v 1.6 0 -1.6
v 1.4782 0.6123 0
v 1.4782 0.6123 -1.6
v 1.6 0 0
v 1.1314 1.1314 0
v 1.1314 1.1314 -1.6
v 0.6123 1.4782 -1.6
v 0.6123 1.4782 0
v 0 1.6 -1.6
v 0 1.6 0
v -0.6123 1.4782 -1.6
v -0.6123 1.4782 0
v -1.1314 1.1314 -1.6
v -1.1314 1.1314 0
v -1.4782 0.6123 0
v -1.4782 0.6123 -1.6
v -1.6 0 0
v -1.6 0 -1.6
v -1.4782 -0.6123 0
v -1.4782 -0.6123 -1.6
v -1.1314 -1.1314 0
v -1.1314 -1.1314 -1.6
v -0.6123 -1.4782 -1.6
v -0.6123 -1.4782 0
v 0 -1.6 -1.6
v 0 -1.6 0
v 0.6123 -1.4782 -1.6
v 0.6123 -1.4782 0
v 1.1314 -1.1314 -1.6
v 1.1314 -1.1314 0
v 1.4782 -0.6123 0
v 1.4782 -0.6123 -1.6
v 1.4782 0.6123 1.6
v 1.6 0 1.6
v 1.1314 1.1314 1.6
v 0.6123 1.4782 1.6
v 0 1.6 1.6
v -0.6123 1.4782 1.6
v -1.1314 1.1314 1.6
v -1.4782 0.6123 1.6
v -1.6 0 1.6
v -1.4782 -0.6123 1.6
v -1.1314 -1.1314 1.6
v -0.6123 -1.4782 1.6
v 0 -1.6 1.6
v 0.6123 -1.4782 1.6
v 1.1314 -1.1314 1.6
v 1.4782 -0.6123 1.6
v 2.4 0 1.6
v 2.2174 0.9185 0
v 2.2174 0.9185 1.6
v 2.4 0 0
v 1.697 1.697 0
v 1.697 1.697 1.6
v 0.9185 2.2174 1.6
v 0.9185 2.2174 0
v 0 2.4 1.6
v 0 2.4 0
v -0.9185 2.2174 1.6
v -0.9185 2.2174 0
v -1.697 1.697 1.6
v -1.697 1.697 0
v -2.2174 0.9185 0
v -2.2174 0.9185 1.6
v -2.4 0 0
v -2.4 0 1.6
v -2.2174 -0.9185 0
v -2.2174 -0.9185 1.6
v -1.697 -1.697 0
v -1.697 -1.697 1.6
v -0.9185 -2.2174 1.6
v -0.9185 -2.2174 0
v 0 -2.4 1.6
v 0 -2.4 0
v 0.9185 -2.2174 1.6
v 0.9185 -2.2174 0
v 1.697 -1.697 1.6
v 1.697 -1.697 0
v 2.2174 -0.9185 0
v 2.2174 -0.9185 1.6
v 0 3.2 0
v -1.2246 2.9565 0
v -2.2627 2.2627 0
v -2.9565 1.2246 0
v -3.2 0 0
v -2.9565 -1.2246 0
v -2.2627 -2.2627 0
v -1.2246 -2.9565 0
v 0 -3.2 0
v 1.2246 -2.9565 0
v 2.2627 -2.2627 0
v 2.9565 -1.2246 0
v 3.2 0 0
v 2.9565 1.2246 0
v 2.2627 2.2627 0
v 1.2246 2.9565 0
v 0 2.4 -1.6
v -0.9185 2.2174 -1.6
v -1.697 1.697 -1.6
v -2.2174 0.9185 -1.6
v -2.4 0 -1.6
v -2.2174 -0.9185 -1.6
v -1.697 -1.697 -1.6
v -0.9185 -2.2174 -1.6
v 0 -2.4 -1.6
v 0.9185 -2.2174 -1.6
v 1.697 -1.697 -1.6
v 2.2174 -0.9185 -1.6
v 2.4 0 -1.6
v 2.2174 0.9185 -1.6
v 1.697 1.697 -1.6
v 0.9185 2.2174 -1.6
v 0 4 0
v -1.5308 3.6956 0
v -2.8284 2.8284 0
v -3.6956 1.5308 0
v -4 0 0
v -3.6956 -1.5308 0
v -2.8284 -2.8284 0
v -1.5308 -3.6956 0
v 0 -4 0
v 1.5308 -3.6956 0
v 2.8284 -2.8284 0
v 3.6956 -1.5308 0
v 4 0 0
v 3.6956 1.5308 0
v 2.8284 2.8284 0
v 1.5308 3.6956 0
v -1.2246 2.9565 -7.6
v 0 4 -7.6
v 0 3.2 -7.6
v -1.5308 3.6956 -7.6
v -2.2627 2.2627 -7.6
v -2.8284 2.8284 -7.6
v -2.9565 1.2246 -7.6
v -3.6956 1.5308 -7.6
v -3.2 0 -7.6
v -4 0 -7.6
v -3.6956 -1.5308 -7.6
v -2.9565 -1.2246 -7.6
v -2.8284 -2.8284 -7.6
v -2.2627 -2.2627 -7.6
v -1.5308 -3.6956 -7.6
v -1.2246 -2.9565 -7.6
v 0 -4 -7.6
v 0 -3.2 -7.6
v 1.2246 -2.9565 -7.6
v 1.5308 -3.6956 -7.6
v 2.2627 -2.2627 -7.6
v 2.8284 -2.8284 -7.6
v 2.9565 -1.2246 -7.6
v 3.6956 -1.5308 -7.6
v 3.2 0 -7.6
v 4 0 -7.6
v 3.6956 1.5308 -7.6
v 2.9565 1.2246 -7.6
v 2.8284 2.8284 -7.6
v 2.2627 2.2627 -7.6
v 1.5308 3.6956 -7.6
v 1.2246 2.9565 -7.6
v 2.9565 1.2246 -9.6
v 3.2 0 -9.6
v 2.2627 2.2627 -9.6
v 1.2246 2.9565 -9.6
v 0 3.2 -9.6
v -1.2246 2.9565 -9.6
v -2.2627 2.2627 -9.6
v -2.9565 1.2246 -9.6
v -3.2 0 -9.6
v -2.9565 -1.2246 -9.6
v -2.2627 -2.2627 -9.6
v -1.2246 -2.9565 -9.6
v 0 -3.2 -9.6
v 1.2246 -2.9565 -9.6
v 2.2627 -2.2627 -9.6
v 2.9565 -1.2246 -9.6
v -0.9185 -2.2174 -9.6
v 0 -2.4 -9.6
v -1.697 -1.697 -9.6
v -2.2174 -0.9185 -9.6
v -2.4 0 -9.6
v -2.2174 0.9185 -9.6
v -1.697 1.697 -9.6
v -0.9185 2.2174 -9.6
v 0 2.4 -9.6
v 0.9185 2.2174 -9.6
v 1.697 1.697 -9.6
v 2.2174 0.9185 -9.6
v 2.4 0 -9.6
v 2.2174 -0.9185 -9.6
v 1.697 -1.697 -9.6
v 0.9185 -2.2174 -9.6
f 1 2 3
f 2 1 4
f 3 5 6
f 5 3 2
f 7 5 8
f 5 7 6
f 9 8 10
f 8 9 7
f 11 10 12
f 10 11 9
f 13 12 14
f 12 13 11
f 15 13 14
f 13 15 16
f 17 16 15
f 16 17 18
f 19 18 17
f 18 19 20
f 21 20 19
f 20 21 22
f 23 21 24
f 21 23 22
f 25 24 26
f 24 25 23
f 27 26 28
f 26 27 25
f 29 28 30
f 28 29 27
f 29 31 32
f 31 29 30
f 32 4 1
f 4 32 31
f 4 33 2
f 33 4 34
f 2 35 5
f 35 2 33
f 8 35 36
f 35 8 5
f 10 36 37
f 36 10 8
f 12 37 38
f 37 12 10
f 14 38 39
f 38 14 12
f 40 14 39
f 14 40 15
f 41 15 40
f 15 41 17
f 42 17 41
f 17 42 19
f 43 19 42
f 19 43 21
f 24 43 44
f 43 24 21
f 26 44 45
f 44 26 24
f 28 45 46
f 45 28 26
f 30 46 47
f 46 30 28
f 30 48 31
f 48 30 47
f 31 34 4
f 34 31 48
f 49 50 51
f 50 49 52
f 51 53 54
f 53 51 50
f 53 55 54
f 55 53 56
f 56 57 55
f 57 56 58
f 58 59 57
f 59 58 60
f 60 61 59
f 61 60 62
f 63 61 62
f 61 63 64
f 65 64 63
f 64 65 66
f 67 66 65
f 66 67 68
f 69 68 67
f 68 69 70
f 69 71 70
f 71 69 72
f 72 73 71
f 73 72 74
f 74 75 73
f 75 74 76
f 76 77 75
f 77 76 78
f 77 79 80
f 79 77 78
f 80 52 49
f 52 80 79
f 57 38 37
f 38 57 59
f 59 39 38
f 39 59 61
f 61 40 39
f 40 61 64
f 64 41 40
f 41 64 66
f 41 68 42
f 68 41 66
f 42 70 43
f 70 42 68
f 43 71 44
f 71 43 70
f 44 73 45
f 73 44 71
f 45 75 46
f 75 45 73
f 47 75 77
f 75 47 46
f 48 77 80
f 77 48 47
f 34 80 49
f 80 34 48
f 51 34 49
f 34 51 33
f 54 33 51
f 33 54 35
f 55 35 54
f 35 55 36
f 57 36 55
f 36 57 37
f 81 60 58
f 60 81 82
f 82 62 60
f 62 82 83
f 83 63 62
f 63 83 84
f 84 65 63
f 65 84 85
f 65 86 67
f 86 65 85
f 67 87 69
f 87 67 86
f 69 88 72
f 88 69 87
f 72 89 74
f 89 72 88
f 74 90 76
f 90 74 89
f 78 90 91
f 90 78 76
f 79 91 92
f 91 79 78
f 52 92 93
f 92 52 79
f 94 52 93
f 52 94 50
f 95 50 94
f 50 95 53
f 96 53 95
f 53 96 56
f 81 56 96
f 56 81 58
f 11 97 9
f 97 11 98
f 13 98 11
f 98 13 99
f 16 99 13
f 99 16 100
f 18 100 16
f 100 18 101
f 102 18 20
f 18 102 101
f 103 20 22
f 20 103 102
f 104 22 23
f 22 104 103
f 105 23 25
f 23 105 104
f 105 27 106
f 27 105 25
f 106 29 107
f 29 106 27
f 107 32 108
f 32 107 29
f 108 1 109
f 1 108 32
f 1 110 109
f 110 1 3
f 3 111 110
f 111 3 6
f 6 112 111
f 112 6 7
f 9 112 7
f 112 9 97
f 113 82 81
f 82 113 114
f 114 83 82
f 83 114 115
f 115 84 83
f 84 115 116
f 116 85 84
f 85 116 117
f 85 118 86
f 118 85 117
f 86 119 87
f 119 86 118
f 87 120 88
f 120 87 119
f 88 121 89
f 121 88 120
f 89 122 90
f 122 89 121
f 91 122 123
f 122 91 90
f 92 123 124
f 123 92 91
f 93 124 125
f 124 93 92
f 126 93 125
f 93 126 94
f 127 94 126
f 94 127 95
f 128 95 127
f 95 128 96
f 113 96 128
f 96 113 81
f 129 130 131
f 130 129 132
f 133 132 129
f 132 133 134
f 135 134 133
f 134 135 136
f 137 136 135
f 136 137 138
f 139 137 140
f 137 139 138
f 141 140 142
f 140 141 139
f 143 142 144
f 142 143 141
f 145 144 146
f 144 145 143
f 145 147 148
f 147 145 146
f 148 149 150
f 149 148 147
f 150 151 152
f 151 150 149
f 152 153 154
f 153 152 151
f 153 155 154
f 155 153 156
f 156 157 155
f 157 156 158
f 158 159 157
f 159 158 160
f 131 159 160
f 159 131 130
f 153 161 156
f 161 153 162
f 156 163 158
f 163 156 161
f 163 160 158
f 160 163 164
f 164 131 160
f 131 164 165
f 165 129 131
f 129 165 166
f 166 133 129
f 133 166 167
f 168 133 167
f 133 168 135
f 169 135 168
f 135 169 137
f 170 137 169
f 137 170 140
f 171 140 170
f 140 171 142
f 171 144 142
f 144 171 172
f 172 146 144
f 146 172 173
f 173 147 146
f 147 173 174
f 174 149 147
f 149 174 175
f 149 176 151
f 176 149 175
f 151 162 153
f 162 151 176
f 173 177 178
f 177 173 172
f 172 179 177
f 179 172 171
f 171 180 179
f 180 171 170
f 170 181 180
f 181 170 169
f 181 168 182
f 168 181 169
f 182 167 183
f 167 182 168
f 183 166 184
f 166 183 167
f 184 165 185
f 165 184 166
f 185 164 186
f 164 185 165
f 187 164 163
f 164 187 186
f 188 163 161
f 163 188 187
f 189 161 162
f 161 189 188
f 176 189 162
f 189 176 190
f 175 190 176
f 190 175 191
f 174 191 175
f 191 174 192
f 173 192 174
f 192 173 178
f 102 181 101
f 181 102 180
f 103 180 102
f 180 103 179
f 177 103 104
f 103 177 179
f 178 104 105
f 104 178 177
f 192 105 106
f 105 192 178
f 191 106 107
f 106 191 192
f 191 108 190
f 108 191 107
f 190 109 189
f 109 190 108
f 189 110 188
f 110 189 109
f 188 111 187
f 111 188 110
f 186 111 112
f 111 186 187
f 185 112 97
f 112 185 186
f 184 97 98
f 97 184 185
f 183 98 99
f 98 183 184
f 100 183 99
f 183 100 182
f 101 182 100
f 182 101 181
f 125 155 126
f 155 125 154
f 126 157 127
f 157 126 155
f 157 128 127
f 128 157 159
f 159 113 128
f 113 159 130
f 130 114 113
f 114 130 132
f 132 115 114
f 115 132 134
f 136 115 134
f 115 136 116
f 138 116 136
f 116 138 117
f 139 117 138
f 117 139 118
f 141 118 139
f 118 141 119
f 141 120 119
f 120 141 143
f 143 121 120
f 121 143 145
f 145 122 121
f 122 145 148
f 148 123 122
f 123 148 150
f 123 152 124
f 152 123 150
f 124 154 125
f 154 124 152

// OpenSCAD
// file: ../p/stud4od.scad
use <../lib.scad>
use <4-4cylo.scad>
use <4-4ring3.scad>
function ldraw_lib__stud4od() = [
// 0 Stud Tube Open without Outer Cylinder and Top Surface
// 0 Name: stud4od.dat
// 0 Author: Philippe Hurbain [Philo]
// 0 !LDRAW_ORG Primitive UPDATE 2013-02
// 0 !LICENSE Licensed under CC BY 2.0 and CC BY 4.0 : see CAreadme.txt
// 
// 0 !HELP This stud is a "antistud" to be used like a underside stud,
// 0 !HELP but without the outer cylinder.
// 0 !HELP 1 47 0 0 0 1 0 0 0 1 0 0 0 1 stud4.dat
// 
// 0 BFC CERTIFY CCW
  [0,"BFC","CERTIFY"],
  [0,"BFC","CCW"],
// 
// 0 !HISTORY 2013-12-23 [PTadmin] Official Update 2013-02
// 
// 
// 1 16 0 -4 0 2 0 0 0 1 0 0 0 2 4-4ring3.dat
  [1,16,0,-4,0,2,0,0,0,1,0,0,0,2, ldraw_lib__4_4ring3()],
// 0 BFC INVERTNEXT
  [0,"BFC","INVERTNEXT"],
// 1 16 0 0 0 -6 0 0 0 -4 0 0 0 6 4-4cylo.dat
  [1,16,0,0,0,-6,0,0,0,-4,0,0,0,6, ldraw_lib__4_4cylo()],
];
makepoly(ldraw_lib__stud4od(), line=0.2);
// file: ../p/stud2a.scad
use <../lib.scad>
use <4-4cyli.scad>
use <4-4edge.scad>
use <4-4ring2.scad>
function ldraw_lib__stud2a() = [
// 0 Stud Open without Base Edges
// 0 Name: stud2a.dat
// 0 Author: James Jessiman
// 0 !LDRAW_ORG Primitive UPDATE 2009-02
// 0 !LICENSE Licensed under CC BY 2.0 and CC BY 4.0 : see CAreadme.txt
// 
// 0 BFC CERTIFY CCW
  [0,"BFC","CERTIFY"],
  [0,"BFC","CCW"],
// 
// 0 !HISTORY 1999-07-05 [PTadmin] Official Update 1999-05
// 0 !HISTORY 2002-04-04 [sbliss] Modified for BFC compliance
// 0 !HISTORY 2002-04-25 [PTadmin] Official Update 2002-02
// 0 !HISTORY 2007-06-24 [PTadmin] Header formatted for Contributor Agreement
// 0 !HISTORY 2008-07-01 [PTadmin] Official Update 2008-01
// 0 !HISTORY 2009-06-21 [cwdee] Update ring references to 4-4ring
// 0 !HISTORY 2009-09-03 [PTadmin] Official Update 2009-02
// 
// 
// 1 16 0 -4 0 4 0 0 0 1 0 0 0 4 4-4edge.dat
  [1,16,0,-4,0,4,0,0,0,1,0,0,0,4, ldraw_lib__4_4edge()],
// 1 16 0 -4 0 6 0 0 0 1 0 0 0 6 4-4edge.dat
  [1,16,0,-4,0,6,0,0,0,1,0,0,0,6, ldraw_lib__4_4edge()],
// 0 BFC INVERTNEXT
  [0,"BFC","INVERTNEXT"],
// 1 16 0 -4 0 4 0 0 0 4 0 0 0 4 4-4cyli.dat
  [1,16,0,-4,0,4,0,0,0,4,0,0,0,4, ldraw_lib__4_4cyli()],
// 1 16 0 -4 0 6 0 0 0 4 0 0 0 6 4-4cyli.dat
  [1,16,0,-4,0,6,0,0,0,4,0,0,0,6, ldraw_lib__4_4cyli()],
// 1 16 0 -4 0 2 0 0 0 1 0 0 0 2 4-4ring2.dat
  [1,16,0,-4,0,2,0,0,0,1,0,0,0,2, ldraw_lib__4_4ring2()],
// 0
];
makepoly(ldraw_lib__stud2a(), line=0.2);
// file: ../p/4-4ring4.scad
use <../lib.scad>
function ldraw_lib__4_4ring4() = [
// 0 Ring  4 x 1.0
// 0 Name: 4-4ring4.dat
// 0 Author: James Jessiman
// 0 !LDRAW_ORG Primitive UPDATE 2009-01
// 0 !LICENSE Licensed under CC BY 2.0 and CC BY 4.0 : see CAreadme.txt
// 
// 0 BFC CERTIFY CCW
  [0,"BFC","CERTIFY"],
  [0,"BFC","CCW"],
// 
// 0 !HISTORY 1998-12-15 [PTadmin] Official Update 1998-10
// 0 !HISTORY 2002-04-08 [BrickCaster] Modified for BFC compliance
// 0 !HISTORY 2002-04-25 [PTadmin] Official Update 2002-02
// 0 !HISTORY 2007-06-24 [PTadmin] Header formatted for Contributor Agreement
// 0 !HISTORY 2008-07-01 [PTadmin] Official Update 2008-01
// 0 !HISTORY 2008-08-26 [cwdee] Switch polygon winding and rename
// 0 !HISTORY 2009-05-02 [PTadmin] Official Update 2009-01
// 
// 
// 4 16 -1.9135 0 4.6195 -1.5308 0 3.6956 0 0 4 0 0 5
  [4,16,-1.9135,0,4.6195,-1.5308,0,3.6956,0,0,4,0,0,5],
// 4 16 -3.5355 0 3.5355 -2.8284 0 2.8284 -1.5308 0 3.6956 -1.9135 0 4.6195
  [4,16,-3.5355,0,3.5355,-2.8284,0,2.8284,-1.5308,0,3.6956,-1.9135,0,4.6195],
// 4 16 -4.6195 0 1.9135 -3.6956 0 1.5308 -2.8284 0 2.8284 -3.5355 0 3.5355
  [4,16,-4.6195,0,1.9135,-3.6956,0,1.5308,-2.8284,0,2.8284,-3.5355,0,3.5355],
// 4 16 -5 0 0 -4 0 0 -3.6956 0 1.5308 -4.6195 0 1.9135
  [4,16,-5,0,0,-4,0,0,-3.6956,0,1.5308,-4.6195,0,1.9135],
// 4 16 -4.6195 0 -1.9135 -3.6956 0 -1.5308 -4 0 0 -5 0 0
  [4,16,-4.6195,0,-1.9135,-3.6956,0,-1.5308,-4,0,0,-5,0,0],
// 4 16 -3.5355 0 -3.5355 -2.8284 0 -2.8284 -3.6956 0 -1.5308 -4.6195 0 -1.9135
  [4,16,-3.5355,0,-3.5355,-2.8284,0,-2.8284,-3.6956,0,-1.5308,-4.6195,0,-1.9135],
// 4 16 -1.9135 0 -4.6195 -1.5308 0 -3.6956 -2.8284 0 -2.8284 -3.5355 0 -3.5355
  [4,16,-1.9135,0,-4.6195,-1.5308,0,-3.6956,-2.8284,0,-2.8284,-3.5355,0,-3.5355],
// 4 16 0 0 -5 0 0 -4 -1.5308 0 -3.6956 -1.9135 0 -4.6195
  [4,16,0,0,-5,0,0,-4,-1.5308,0,-3.6956,-1.9135,0,-4.6195],
// 4 16 1.9135 0 -4.6195 1.5308 0 -3.6956 0 0 -4 0 0 -5
  [4,16,1.9135,0,-4.6195,1.5308,0,-3.6956,0,0,-4,0,0,-5],
// 4 16 3.5355 0 -3.5355 2.8284 0 -2.8284 1.5308 0 -3.6956 1.9135 0 -4.6195
  [4,16,3.5355,0,-3.5355,2.8284,0,-2.8284,1.5308,0,-3.6956,1.9135,0,-4.6195],
// 4 16 4.6195 0 -1.9135 3.6956 0 -1.5308 2.8284 0 -2.8284 3.5355 0 -3.5355
  [4,16,4.6195,0,-1.9135,3.6956,0,-1.5308,2.8284,0,-2.8284,3.5355,0,-3.5355],
// 4 16 5 0 0 4 0 0 3.6956 0 -1.5308 4.6195 0 -1.9135
  [4,16,5,0,0,4,0,0,3.6956,0,-1.5308,4.6195,0,-1.9135],
// 4 16 4.6195 0 1.9135 3.6956 0 1.5308 4 0 0 5 0 0
  [4,16,4.6195,0,1.9135,3.6956,0,1.5308,4,0,0,5,0,0],
// 4 16 3.5355 0 3.5355 2.8284 0 2.8284 3.6956 0 1.5308 4.6195 0 1.9135
  [4,16,3.5355,0,3.5355,2.8284,0,2.8284,3.6956,0,1.5308,4.6195,0,1.9135],
// 4 16 1.9135 0 4.6195 1.5308 0 3.6956 2.8284 0 2.8284 3.5355 0 3.5355
  [4,16,1.9135,0,4.6195,1.5308,0,3.6956,2.8284,0,2.8284,3.5355,0,3.5355],
// 4 16 0 0 5 0 0 4 1.5308 0 3.6956 1.9135 0 4.6195
  [4,16,0,0,5,0,0,4,1.5308,0,3.6956,1.9135,0,4.6195],
// 0
];
makepoly(ldraw_lib__4_4ring4(), line=0.2);
// file: ../p/4-4ring3.scad
use <../lib.scad>
function ldraw_lib__4_4ring3() = [
// 0 Ring  3 x 1.0
// 0 Name: 4-4ring3.dat
// 0 Author: James Jessiman
// 0 !LDRAW_ORG Primitive UPDATE 2009-01
// 0 !LICENSE Licensed under CC BY 2.0 and CC BY 4.0 : see CAreadme.txt
// 
// 0 BFC CERTIFY CCW
  [0,"BFC","CERTIFY"],
  [0,"BFC","CCW"],
// 
// 0 !HISTORY 1998-12-15 [PTadmin] Official Update 1998-10
// 0 !HISTORY 2002-04-05 [hafhead] Added BFC statement
// 0 !HISTORY 2002-04-25 [PTadmin] Official Update 2002-02
// 0 !HISTORY 2007-06-24 [PTadmin] Header formatted for Contributor Agreement
// 0 !HISTORY 2008-07-01 [PTadmin] Official Update 2008-01
// 0 !HISTORY 2008-08-26 [cwdee] Switch polygon winding and rename
// 0 !HISTORY 2009-05-02 [PTadmin] Official Update 2009-01
// 
// 
// 4 16 -1.5308 0 3.6956 -1.1481 0 2.7717 0 0 3 0 0 4
  [4,16,-1.5308,0,3.6956,-1.1481,0,2.7717,0,0,3,0,0,4],
// 4 16 -2.8284 0 2.8284 -2.1213 0 2.1213 -1.1481 0 2.7717 -1.5308 0 3.6956
  [4,16,-2.8284,0,2.8284,-2.1213,0,2.1213,-1.1481,0,2.7717,-1.5308,0,3.6956],
// 4 16 -3.6956 0 1.5308 -2.7717 0 1.1481 -2.1213 0 2.1213 -2.8284 0 2.8284
  [4,16,-3.6956,0,1.5308,-2.7717,0,1.1481,-2.1213,0,2.1213,-2.8284,0,2.8284],
// 4 16 -4 0 0 -3 0 0 -2.7717 0 1.1481 -3.6956 0 1.5308
  [4,16,-4,0,0,-3,0,0,-2.7717,0,1.1481,-3.6956,0,1.5308],
// 4 16 -3.6956 0 -1.5308 -2.7717 0 -1.1481 -3 0 0 -4 0 0
  [4,16,-3.6956,0,-1.5308,-2.7717,0,-1.1481,-3,0,0,-4,0,0],
// 4 16 -2.8284 0 -2.8284 -2.1213 0 -2.1213 -2.7717 0 -1.1481 -3.6956 0 -1.5308
  [4,16,-2.8284,0,-2.8284,-2.1213,0,-2.1213,-2.7717,0,-1.1481,-3.6956,0,-1.5308],
// 4 16 -1.5308 0 -3.6956 -1.1481 0 -2.7717 -2.1213 0 -2.1213 -2.8284 0 -2.8284
  [4,16,-1.5308,0,-3.6956,-1.1481,0,-2.7717,-2.1213,0,-2.1213,-2.8284,0,-2.8284],
// 4 16 0 0 -4 0 0 -3 -1.1481 0 -2.7717 -1.5308 0 -3.6956
  [4,16,0,0,-4,0,0,-3,-1.1481,0,-2.7717,-1.5308,0,-3.6956],
// 4 16 1.5308 0 -3.6956 1.1481 0 -2.7717 0 0 -3 0 0 -4
  [4,16,1.5308,0,-3.6956,1.1481,0,-2.7717,0,0,-3,0,0,-4],
// 4 16 2.8284 0 -2.8284 2.1213 0 -2.1213 1.1481 0 -2.7717 1.5308 0 -3.6956
  [4,16,2.8284,0,-2.8284,2.1213,0,-2.1213,1.1481,0,-2.7717,1.5308,0,-3.6956],
// 4 16 3.6956 0 -1.5308 2.7717 0 -1.1481 2.1213 0 -2.1213 2.8284 0 -2.8284
  [4,16,3.6956,0,-1.5308,2.7717,0,-1.1481,2.1213,0,-2.1213,2.8284,0,-2.8284],
// 4 16 4 0 0 3 0 0 2.7717 0 -1.1481 3.6956 0 -1.5308
  [4,16,4,0,0,3,0,0,2.7717,0,-1.1481,3.6956,0,-1.5308],
// 4 16 3.6956 0 1.5308 2.7717 0 1.1481 3 0 0 4 0 0
  [4,16,3.6956,0,1.5308,2.7717,0,1.1481,3,0,0,4,0,0],
// 4 16 2.8284 0 2.8284 2.1213 0 2.1213 2.7717 0 1.1481 3.6956 0 1.5308
  [4,16,2.8284,0,2.8284,2.1213,0,2.1213,2.7717,0,1.1481,3.6956,0,1.5308],
// 4 16 1.5308 0 3.6956 1.1481 0 2.7717 2.1213 0 2.1213 2.8284 0 2.8284
  [4,16,1.5308,0,3.6956,1.1481,0,2.7717,2.1213,0,2.1213,2.8284,0,2.8284],
// 4 16 0 0 4 0 0 3 1.1481 0 2.7717 1.5308 0 3.6956
  [4,16,0,0,4,0,0,3,1.1481,0,2.7717,1.5308,0,3.6956],
// 0
];
makepoly(ldraw_lib__4_4ring3(), line=0.2);
// file: ../p/4-4ring2.scad
use <../lib.scad>
function ldraw_lib__4_4ring2() = [
// 0 Ring  2 x 1.0
// 0 Name: 4-4ring2.dat
// 0 Author: James Jessiman
// 0 !LDRAW_ORG Primitive UPDATE 2009-01
// 0 !LICENSE Licensed under CC BY 2.0 and CC BY 4.0 : see CAreadme.txt
// 
// 0 BFC CERTIFY CCW
  [0,"BFC","CERTIFY"],
  [0,"BFC","CCW"],
// 
// 0 !HISTORY 1998-12-15 [PTadmin] Official Update 1998-10
// 0 !HISTORY 2002-04-05 [hafhead] Added BFC statement
// 0 !HISTORY 2002-04-25 [PTadmin] Official Update 2002-02
// 0 !HISTORY 2007-06-24 [PTadmin] Header formatted for Contributor Agreement
// 0 !HISTORY 2008-07-01 [PTadmin] Official Update 2008-01
// 0 !HISTORY 2008-08-26 [cwdee] Switch polygon winding and rename
// 0 !HISTORY 2009-05-02 [PTadmin] Official Update 2009-01
// 
// 
// 4 16 -1.1481 0 2.7717 -0.7654 0 1.8478 0 0 2 0 0 3
  [4,16,-1.1481,0,2.7717,-0.7654,0,1.8478,0,0,2,0,0,3],
// 4 16 -2.1213 0 2.1213 -1.4142 0 1.4142 -0.7654 0 1.8478 -1.1481 0 2.7717
  [4,16,-2.1213,0,2.1213,-1.4142,0,1.4142,-0.7654,0,1.8478,-1.1481,0,2.7717],
// 4 16 -2.7717 0 1.1481 -1.8478 0 0.7654 -1.4142 0 1.4142 -2.1213 0 2.1213
  [4,16,-2.7717,0,1.1481,-1.8478,0,0.7654,-1.4142,0,1.4142,-2.1213,0,2.1213],
// 4 16 -3 0 0 -2 0 0 -1.8478 0 0.7654 -2.7717 0 1.1481
  [4,16,-3,0,0,-2,0,0,-1.8478,0,0.7654,-2.7717,0,1.1481],
// 4 16 -2.7717 0 -1.1481 -1.8478 0 -0.7654 -2 0 0 -3 0 0
  [4,16,-2.7717,0,-1.1481,-1.8478,0,-0.7654,-2,0,0,-3,0,0],
// 4 16 -2.1213 0 -2.1213 -1.4142 0 -1.4142 -1.8478 0 -0.7654 -2.7717 0 -1.1481
  [4,16,-2.1213,0,-2.1213,-1.4142,0,-1.4142,-1.8478,0,-0.7654,-2.7717,0,-1.1481],
// 4 16 -1.1481 0 -2.7717 -0.7654 0 -1.8478 -1.4142 0 -1.4142 -2.1213 0 -2.1213
  [4,16,-1.1481,0,-2.7717,-0.7654,0,-1.8478,-1.4142,0,-1.4142,-2.1213,0,-2.1213],
// 4 16 0 0 -3 0 0 -2 -0.7654 0 -1.8478 -1.1481 0 -2.7717
  [4,16,0,0,-3,0,0,-2,-0.7654,0,-1.8478,-1.1481,0,-2.7717],
// 4 16 1.1481 0 -2.7717 0.7654 0 -1.8478 0 0 -2 0 0 -3
  [4,16,1.1481,0,-2.7717,0.7654,0,-1.8478,0,0,-2,0,0,-3],
// 4 16 2.1213 0 -2.1213 1.4142 0 -1.4142 0.7654 0 -1.8478 1.1481 0 -2.7717
  [4,16,2.1213,0,-2.1213,1.4142,0,-1.4142,0.7654,0,-1.8478,1.1481,0,-2.7717],
// 4 16 2.7717 0 -1.1481 1.8478 0 -0.7654 1.4142 0 -1.4142 2.1213 0 -2.1213
  [4,16,2.7717,0,-1.1481,1.8478,0,-0.7654,1.4142,0,-1.4142,2.1213,0,-2.1213],
// 4 16 3 0 0 2 0 0 1.8478 0 -0.7654 2.7717 0 -1.1481
  [4,16,3,0,0,2,0,0,1.8478,0,-0.7654,2.7717,0,-1.1481],
// 4 16 2.7717 0 1.1481 1.8478 0 0.7654 2 0 0 3 0 0
  [4,16,2.7717,0,1.1481,1.8478,0,0.7654,2,0,0,3,0,0],
// 4 16 2.1213 0 2.1213 1.4142 0 1.4142 1.8478 0 0.7654 2.7717 0 1.1481
  [4,16,2.1213,0,2.1213,1.4142,0,1.4142,1.8478,0,0.7654,2.7717,0,1.1481],
// 4 16 1.1481 0 2.7717 0.7654 0 1.8478 1.4142 0 1.4142 2.1213 0 2.1213
  [4,16,1.1481,0,2.7717,0.7654,0,1.8478,1.4142,0,1.4142,2.1213,0,2.1213],
// 4 16 0 0 3 0 0 2 0.7654 0 1.8478 1.1481 0 2.7717
  [4,16,0,0,3,0,0,2,0.7654,0,1.8478,1.1481,0,2.7717],
// 0
];
makepoly(ldraw_lib__4_4ring2(), line=0.2);
// file: ../p/4-4edge.scad
use <../lib.scad>
function ldraw_lib__4_4edge() = [
// 0 Circle 1.0
// 0 Name: 4-4edge.dat
// 0 Author: James Jessiman
// 0 !LDRAW_ORG Primitive UPDATE 2017-01
// 0 !LICENSE Licensed under CC BY 2.0 and CC BY 4.0 : see CAreadme.txt
// 
// 0 BFC CERTIFY CCW
  [0,"BFC","CERTIFY"],
  [0,"BFC","CCW"],
// 
// 0 !HISTORY 1998-12-15 [PTadmin] Official Update 1998-10
// 0 !HISTORY 2005-12-28 [PTadmin] Official Update 2005-01
// 0 !HISTORY 2007-06-24 [PTadmin] Header formatted for Contributor Agreement
// 0 !HISTORY 2008-07-01 [PTadmin] Official Update 2008-01
// 0 !HISTORY 2017-01-15 [Steffen] BFCed
// 0 !HISTORY 2017-12-30 [PTadmin] Official Update 2017-01
// 
// 
// 2 24 1 0 0 0.9239 0 0.3827
  [2,24,1,0,0,0.9239,0,0.3827],
// 2 24 0.9239 0 0.3827 0.7071 0 0.7071
  [2,24,0.9239,0,0.3827,0.7071,0,0.7071],
// 2 24 0.7071 0 0.7071 0.3827 0 0.9239
  [2,24,0.7071,0,0.7071,0.3827,0,0.9239],
// 2 24 0.3827 0 0.9239 0 0 1
  [2,24,0.3827,0,0.9239,0,0,1],
// 2 24 0 0 1 -0.3827 0 0.9239
  [2,24,0,0,1,-0.3827,0,0.9239],
// 2 24 -0.3827 0 0.9239 -0.7071 0 0.7071
  [2,24,-0.3827,0,0.9239,-0.7071,0,0.7071],
// 2 24 -0.7071 0 0.7071 -0.9239 0 0.3827
  [2,24,-0.7071,0,0.7071,-0.9239,0,0.3827],
// 2 24 -0.9239 0 0.3827 -1 0 -0
  [2,24,-0.9239,0,0.3827,-1,0,-0],
// 2 24 -1 0 -0 -0.9239 0 -0.3827
  [2,24,-1,0,-0,-0.9239,0,-0.3827],
// 2 24 -0.9239 0 -0.3827 -0.7071 0 -0.7071
  [2,24,-0.9239,0,-0.3827,-0.7071,0,-0.7071],
// 2 24 -0.7071 0 -0.7071 -0.3827 0 -0.9239
  [2,24,-0.7071,0,-0.7071,-0.3827,0,-0.9239],
// 2 24 -0.3827 0 -0.9239 0 0 -1
  [2,24,-0.3827,0,-0.9239,0,0,-1],
// 2 24 0 0 -1 0.3827 0 -0.9239
  [2,24,0,0,-1,0.3827,0,-0.9239],
// 2 24 0.3827 0 -0.9239 0.7071 0 -0.7071
  [2,24,0.3827,0,-0.9239,0.7071,0,-0.7071],
// 2 24 0.7071 0 -0.7071 0.9239 0 -0.3827
  [2,24,0.7071,0,-0.7071,0.9239,0,-0.3827],
// 2 24 0.9239 0 -0.3827 1 0 0
  [2,24,0.9239,0,-0.3827,1,0,0],
];
makepoly(ldraw_lib__4_4edge(), line=0.2);
// file: ../p/4-4cylo.scad
use <../lib.scad>
use <4-4cyli.scad>
use <4-4edge.scad>
function ldraw_lib__4_4cylo() = [
// 0 Cylinder Open 1.0
// 0 Name: 4-4cylo.dat
// 0 Author: Mark Kennedy [mkennedy]
// 0 !LDRAW_ORG Primitive UPDATE 2010-01
// 0 !LICENSE Licensed under CC BY 2.0 and CC BY 4.0 : see CAreadme.txt
// 
// 0 BFC CERTIFY CCW
  [0,"BFC","CERTIFY"],
  [0,"BFC","CCW"],
// 
// 0 !HISTORY 2010-04-05 [PTadmin] Official Update 2010-01
// 
// 
// 1 16 0 0 0 1 0 0 0 1 0 0 0 1 4-4edge.dat
  [1,16,0,0,0,1,0,0,0,1,0,0,0,1, ldraw_lib__4_4edge()],
// 1 16 0 1 0 1 0 0 0 1 0 0 0 1 4-4edge.dat
  [1,16,0,1,0,1,0,0,0,1,0,0,0,1, ldraw_lib__4_4edge()],
// 1 16 0 0 0 1 0 0 0 1 0 0 0 1 4-4cyli.dat
  [1,16,0,0,0,1,0,0,0,1,0,0,0,1, ldraw_lib__4_4cyli()],
// 0
];
makepoly(ldraw_lib__4_4cylo(), line=0.2);
// file: s/3062bs01.scad
use <../../lib.scad>
use <../../p/4-4cyli.scad>
use <../../p/4-4cylo.scad>
use <../../p/4-4edge.scad>
use <../../p/4-4ring2.scad>
use <../../p/4-4ring3.scad>
use <../../p/4-4ring4.scad>
use <../../p/stud2a.scad>
use <../../p/stud4od.scad>
function ldraw_lib__s__3062bs01() = [
// 0 ~Brick  1 x  1 Round with Hollow Stud without Outer Surface
// 0 Name: s\3062bs01.dat
// 0 Author: Takeshi Takahashi [RainbowDolphin]
// 0 !LDRAW_ORG Subpart UPDATE 2022-02
// 0 !LICENSE Licensed under CC BY 2.0 and CC BY 4.0 : see CAreadme.txt
// 
// 0 BFC CERTIFY CCW
  [0,"BFC","CERTIFY"],
  [0,"BFC","CCW"],
// 
// 0 !HISTORY 2022-03-06 [PTadmin] Official Update 2022-02
// 
// 
// 1 16 0 4 0 4 0 0 0 1 0 0 0 4 4-4edge.dat
  [1,16,0,4,0,4,0,0,0,1,0,0,0,4, ldraw_lib__4_4edge()],
// 1 16 0 19 0 10 0 0 0 1 0 0 0 10 4-4edge.dat
  [1,16,0,19,0,10,0,0,0,1,0,0,0,10, ldraw_lib__4_4edge()],
// 1 16 0 0 0 10 0 0 0 1 0 0 0 10 4-4edge.dat
  [1,16,0,0,0,10,0,0,0,1,0,0,0,10, ldraw_lib__4_4edge()],
// 1 16 0 0 0 6 0 0 0 1 0 0 0 6 4-4edge.dat
  [1,16,0,0,0,6,0,0,0,1,0,0,0,6, ldraw_lib__4_4edge()],
// 0 BFC INVERTNEXT
  [0,"BFC","INVERTNEXT"],
// 1 16 0 0 0 4 0 0 0 4 0 0 0 4 4-4cyli.dat
  [1,16,0,0,0,4,0,0,0,4,0,0,0,4, ldraw_lib__4_4cyli()],
// 1 16 0 0 0 1 0 0 0 1 0 0 0 1 stud2a.dat
  [1,16,0,0,0,1,0,0,0,1,0,0,0,1, ldraw_lib__stud2a()],
// 1 16 0 0 0 2 0 0 0 1 0 0 0 2 4-4ring3.dat
  [1,16,0,0,0,2,0,0,0,1,0,0,0,2, ldraw_lib__4_4ring3()],
// 1 16 0 4 0 2 0 0 0 -1 0 0 0 2 4-4ring2.dat
  [1,16,0,4,0,2,0,0,0,-1,0,0,0,2, ldraw_lib__4_4ring2()],
// 1 16 0 0 0 2 0 0 0 1 0 0 0 2 4-4ring4.dat
  [1,16,0,0,0,2,0,0,0,1,0,0,0,2, ldraw_lib__4_4ring4()],
// 1 16 0 19 0 2 0 0 0 -1 0 0 0 2 4-4ring4.dat
  [1,16,0,19,0,2,0,0,0,-1,0,0,0,2, ldraw_lib__4_4ring4()],
// 1 16 0 19 0 8 0 0 0 5 0 0 0 8 4-4cylo.dat
  [1,16,0,19,0,8,0,0,0,5,0,0,0,8, ldraw_lib__4_4cylo()],
// 1 16 0 4 0 1 0 0 0 -5 0 0 0 -1 stud4od.dat
  [1,16,0,4,0,1,0,0,0,-5,0,0,0,-1, ldraw_lib__stud4od()],
];
makepoly(ldraw_lib__s__3062bs01(), line=0.2);
// file: ../p/4-4cyli.scad
use <../lib.scad>
function ldraw_lib__4_4cyli() = [
// 0 Cylinder 1.0
// 0 Name: 4-4cyli.dat
// 0 Author: James Jessiman
// 0 !LDRAW_ORG Primitive UPDATE 2005-01
// 0 !LICENSE Licensed under CC BY 2.0 and CC BY 4.0 : see CAreadme.txt
// 
// 0 BFC CERTIFY CCW
  [0,"BFC","CERTIFY"],
  [0,"BFC","CCW"],
// 
// 0 !HISTORY 1998-12-15 [PTadmin] Official Update 1998-10
// 0 !HISTORY 2002-03-23 [sbliss] Added BFC statement; merged headers from files in distributions LDraw 0.27 and Complete.
// 0 !HISTORY 2002-04-25 [PTadmin] Official Update 2002-02
// 0 !HISTORY 2004-12-14 [guyvivan] BFC CCW
// 0 !HISTORY 2005-12-28 [PTadmin] Official Update 2005-01
// 0 !HISTORY 2007-06-24 [PTadmin] Header formatted for Contributor Agreement
// 0 !HISTORY 2008-07-01 [PTadmin] Official Update 2008-01
// 
// 
// 4 16 1 1 0 0.9239 1 0.3827 0.9239 0 0.3827 1 0 0
  [4,16,1,1,0,0.9239,1,0.3827,0.9239,0,0.3827,1,0,0],
// 5 24 1 0 0 1 1 0 0.9239 0 0.3827 0.9239 0 -0.3827
  [5,24,1,0,0,1,1,0,0.9239,0,0.3827,0.9239,0,-0.3827],
// 4 16 0.9239 1 0.3827 0.7071 1 0.7071 0.7071 0 0.7071 0.9239 0 0.3827
  [4,16,0.9239,1,0.3827,0.7071,1,0.7071,0.7071,0,0.7071,0.9239,0,0.3827],
// 5 24 0.9239 0 0.3827 0.9239 1 0.3827 0.7071 0 0.7071 1 0 0
  [5,24,0.9239,0,0.3827,0.9239,1,0.3827,0.7071,0,0.7071,1,0,0],
// 4 16 0.7071 1 0.7071 0.3827 1 0.9239 0.3827 0 0.9239 0.7071 0 0.7071
  [4,16,0.7071,1,0.7071,0.3827,1,0.9239,0.3827,0,0.9239,0.7071,0,0.7071],
// 5 24 0.7071 0 0.7071 0.7071 1 0.7071 0.3827 0 0.9239 0.9239 0 0.3827
  [5,24,0.7071,0,0.7071,0.7071,1,0.7071,0.3827,0,0.9239,0.9239,0,0.3827],
// 4 16 0.3827 1 0.9239 0 1 1 0 0 1 0.3827 0 0.9239
  [4,16,0.3827,1,0.9239,0,1,1,0,0,1,0.3827,0,0.9239],
// 5 24 0.3827 0 0.9239 0.3827 1 0.9239 0 0 1 0.7071 0 0.7071
  [5,24,0.3827,0,0.9239,0.3827,1,0.9239,0,0,1,0.7071,0,0.7071],
// 4 16 0 1 1 -0.3827 1 0.9239 -0.3827 0 0.9239 0 0 1
  [4,16,0,1,1,-0.3827,1,0.9239,-0.3827,0,0.9239,0,0,1],
// 5 24 0 0 1 0 1 1 -0.3827 0 0.9239 0.3827 0 0.9239
  [5,24,0,0,1,0,1,1,-0.3827,0,0.9239,0.3827,0,0.9239],
// 4 16 -0.3827 1 0.9239 -0.7071 1 0.7071 -0.7071 0 0.7071 -0.3827 0 0.9239
  [4,16,-0.3827,1,0.9239,-0.7071,1,0.7071,-0.7071,0,0.7071,-0.3827,0,0.9239],
// 5 24 -0.3827 0 0.9239 -0.3827 1 0.9239 -0.7071 0 0.7071 0 0 1
  [5,24,-0.3827,0,0.9239,-0.3827,1,0.9239,-0.7071,0,0.7071,0,0,1],
// 4 16 -0.7071 1 0.7071 -0.9239 1 0.3827 -0.9239 0 0.3827 -0.7071 0 0.7071
  [4,16,-0.7071,1,0.7071,-0.9239,1,0.3827,-0.9239,0,0.3827,-0.7071,0,0.7071],
// 5 24 -0.7071 0 0.7071 -0.7071 1 0.7071 -0.9239 0 0.3827 -0.3827 0 0.9239
  [5,24,-0.7071,0,0.7071,-0.7071,1,0.7071,-0.9239,0,0.3827,-0.3827,0,0.9239],
// 4 16 -0.9239 1 0.3827 -1 1 0 -1 0 0 -0.9239 0 0.3827
  [4,16,-0.9239,1,0.3827,-1,1,0,-1,0,0,-0.9239,0,0.3827],
// 5 24 -0.9239 0 0.3827 -0.9239 1 0.3827 -1 0 0 -0.7071 0 0.7071
  [5,24,-0.9239,0,0.3827,-0.9239,1,0.3827,-1,0,0,-0.7071,0,0.7071],
// 4 16 -1 1 0 -0.9239 1 -0.3827 -0.9239 0 -0.3827 -1 0 0
  [4,16,-1,1,0,-0.9239,1,-0.3827,-0.9239,0,-0.3827,-1,0,0],
// 5 24 -1 0 0 -1 1 0 -0.9239 0 -0.3827 -0.9239 0 0.3827
  [5,24,-1,0,0,-1,1,0,-0.9239,0,-0.3827,-0.9239,0,0.3827],
// 4 16 -0.9239 1 -0.3827 -0.7071 1 -0.7071 -0.7071 0 -0.7071 -0.9239 0 -0.3827
  [4,16,-0.9239,1,-0.3827,-0.7071,1,-0.7071,-0.7071,0,-0.7071,-0.9239,0,-0.3827],
// 5 24 -0.9239 0 -0.3827 -0.9239 1 -0.3827 -0.7071 0 -0.7071 -1 0 0
  [5,24,-0.9239,0,-0.3827,-0.9239,1,-0.3827,-0.7071,0,-0.7071,-1,0,0],
// 4 16 -0.7071 1 -0.7071 -0.3827 1 -0.9239 -0.3827 0 -0.9239 -0.7071 0 -0.7071
  [4,16,-0.7071,1,-0.7071,-0.3827,1,-0.9239,-0.3827,0,-0.9239,-0.7071,0,-0.7071],
// 5 24 -0.7071 0 -0.7071 -0.7071 1 -0.7071 -0.3827 0 -0.9239 -0.9239 0 -0.3827
  [5,24,-0.7071,0,-0.7071,-0.7071,1,-0.7071,-0.3827,0,-0.9239,-0.9239,0,-0.3827],
// 4 16 -0.3827 1 -0.9239 0 1 -1 0 0 -1 -0.3827 0 -0.9239
  [4,16,-0.3827,1,-0.9239,0,1,-1,0,0,-1,-0.3827,0,-0.9239],
// 5 24 -0.3827 0 -0.9239 -0.3827 1 -0.9239 0 0 -1 -0.7071 0 -0.7071
  [5,24,-0.3827,0,-0.9239,-0.3827,1,-0.9239,0,0,-1,-0.7071,0,-0.7071],
// 4 16 0 1 -1 0.3827 1 -0.9239 0.3827 0 -0.9239 0 0 -1
  [4,16,0,1,-1,0.3827,1,-0.9239,0.3827,0,-0.9239,0,0,-1],
// 5 24 0 0 -1 0 1 -1 0.3827 0 -0.9239 -0.3827 0 -0.9239
  [5,24,0,0,-1,0,1,-1,0.3827,0,-0.9239,-0.3827,0,-0.9239],
// 4 16 0.3827 1 -0.9239 0.7071 1 -0.7071 0.7071 0 -0.7071 0.3827 0 -0.9239
  [4,16,0.3827,1,-0.9239,0.7071,1,-0.7071,0.7071,0,-0.7071,0.3827,0,-0.9239],
// 5 24 0.3827 0 -0.9239 0.3827 1 -0.9239 0.7071 0 -0.7071 0 0 -1
  [5,24,0.3827,0,-0.9239,0.3827,1,-0.9239,0.7071,0,-0.7071,0,0,-1],
// 4 16 0.7071 1 -0.7071 0.9239 1 -0.3827 0.9239 0 -0.3827 0.7071 0 -0.7071
  [4,16,0.7071,1,-0.7071,0.9239,1,-0.3827,0.9239,0,-0.3827,0.7071,0,-0.7071],
// 5 24 0.7071 0 -0.7071 0.7071 1 -0.7071 0.9239 0 -0.3827 0.3827 0 -0.9239
  [5,24,0.7071,0,-0.7071,0.7071,1,-0.7071,0.9239,0,-0.3827,0.3827,0,-0.9239],
// 4 16 0.9239 1 -0.3827 1 1 0 1 0 0 0.9239 0 -0.3827
  [4,16,0.9239,1,-0.3827,1,1,0,1,0,0,0.9239,0,-0.3827],
// 5 24 0.9239 0 -0.3827 0.9239 1 -0.3827 1 0 0 0.7071 0 -0.7071
  [5,24,0.9239,0,-0.3827,0.9239,1,-0.3827,1,0,0,0.7071,0,-0.7071],
// 0
];
makepoly(ldraw_lib__4_4cyli(), line=0.2);
// file: 3062b.scad
use <../lib.scad>
use <../p/4-4cyli.scad>
use <s/3062bs01.scad>
function ldraw_lib__3062b() = [
// 0 Brick  1 x  1 Round with Hollow Stud
// 0 Name: 3062b.dat
// 0 Author: James Jessiman
// 0 !LDRAW_ORG Part UPDATE 2022-02
// 0 !LICENSE Licensed under CC BY 2.0 and CC BY 4.0 : see CAreadme.txt
// 
// 0 BFC CERTIFY CCW
  [0,"BFC","CERTIFY"],
  [0,"BFC","CCW"],
// 
// 0 !HISTORY 1998-06-20 [PTadmin] Official Update 1998-06
// 0 !HISTORY 2003-08-02 [OrionP] Made some primitive subs
// 0 !HISTORY 2003-08-04 [Steffen] replaced peghole.dat by stud4a.dat
// 0 !HISTORY 2003-12-19 [PTadmin] Official Update 2003-03
// 0 !HISTORY 2007-06-10 [PTadmin] Header formatted for Contributor Agreement
// 0 !HISTORY 2008-07-01 [PTadmin] Official Update 2008-01
// 0 !HISTORY 2009-03-19 [tchang] Add missing <CR>
// 0 !HISTORY 2009-09-03 [PTadmin] Official Update 2009-02
// 0 !HISTORY 2020-12-12 [RainbowDolphin] Subparted for patterns
// 0 !HISTORY 2022-03-06 [PTadmin] Official Update 2022-02
// 
// 
// 1 16 0 0 0 1 0 0 0 1 0 0 0 1 s\3062bs01.dat
  [1,16,0,0,0,1,0,0,0,1,0,0,0,1, ldraw_lib__s__3062bs01()],
// 1 16 0 0 0 10 0 0 0 19 0 0 0 10 4-4cyli.dat
  [1,16,0,0,0,10,0,0,0,19,0,0,0,10, ldraw_lib__4_4cyli()],
];
makepoly(ldraw_lib__3062b(), line=0.2);
// main file
use <../lib.scad>
use <3062b.scad>
function ldraw_lib__4212454() = [
// 0 ~_Brick  1 x  1 Round with Hollow Stud Lime (Obsolete)
// 0 Name: 4212454.dat
// 0 Author: [PTadmin]
// 0 !LDRAW_ORG Part Physical_Colour UPDATE 2019-02
// 0 !LICENSE Licensed under CC BY 2.0 and CC BY 4.0 : see CAreadme.txt
// 
// 0 BFC CERTIFY CCW
  [0,"BFC","CERTIFY"],
  [0,"BFC","CCW"],
// 
// 0 !HISTORY 2010-12-31 [PTadmin] Official Update 2010-03
// 0 !HISTORY 2019-08-16 [Holly-Wood] Obsoleted per decision not to include physical colour parts
// 0 !HISTORY 2019-09-09 [PTadmin] Official Update 2019-02
// 
// 
// 0 // This file is a "shortcut" with the correct number for the actual
// 0 // colouring of the part (Lime).
// 
// 1 27 0 0 0 1 0 0 0 1 0 0 0 1 3062b.dat
  [1,27,0,0,0,1,0,0,0,1,0,0,0,1, ldraw_lib__3062b()],
];
makepoly(ldraw_lib__4212454(), line=0.2);
